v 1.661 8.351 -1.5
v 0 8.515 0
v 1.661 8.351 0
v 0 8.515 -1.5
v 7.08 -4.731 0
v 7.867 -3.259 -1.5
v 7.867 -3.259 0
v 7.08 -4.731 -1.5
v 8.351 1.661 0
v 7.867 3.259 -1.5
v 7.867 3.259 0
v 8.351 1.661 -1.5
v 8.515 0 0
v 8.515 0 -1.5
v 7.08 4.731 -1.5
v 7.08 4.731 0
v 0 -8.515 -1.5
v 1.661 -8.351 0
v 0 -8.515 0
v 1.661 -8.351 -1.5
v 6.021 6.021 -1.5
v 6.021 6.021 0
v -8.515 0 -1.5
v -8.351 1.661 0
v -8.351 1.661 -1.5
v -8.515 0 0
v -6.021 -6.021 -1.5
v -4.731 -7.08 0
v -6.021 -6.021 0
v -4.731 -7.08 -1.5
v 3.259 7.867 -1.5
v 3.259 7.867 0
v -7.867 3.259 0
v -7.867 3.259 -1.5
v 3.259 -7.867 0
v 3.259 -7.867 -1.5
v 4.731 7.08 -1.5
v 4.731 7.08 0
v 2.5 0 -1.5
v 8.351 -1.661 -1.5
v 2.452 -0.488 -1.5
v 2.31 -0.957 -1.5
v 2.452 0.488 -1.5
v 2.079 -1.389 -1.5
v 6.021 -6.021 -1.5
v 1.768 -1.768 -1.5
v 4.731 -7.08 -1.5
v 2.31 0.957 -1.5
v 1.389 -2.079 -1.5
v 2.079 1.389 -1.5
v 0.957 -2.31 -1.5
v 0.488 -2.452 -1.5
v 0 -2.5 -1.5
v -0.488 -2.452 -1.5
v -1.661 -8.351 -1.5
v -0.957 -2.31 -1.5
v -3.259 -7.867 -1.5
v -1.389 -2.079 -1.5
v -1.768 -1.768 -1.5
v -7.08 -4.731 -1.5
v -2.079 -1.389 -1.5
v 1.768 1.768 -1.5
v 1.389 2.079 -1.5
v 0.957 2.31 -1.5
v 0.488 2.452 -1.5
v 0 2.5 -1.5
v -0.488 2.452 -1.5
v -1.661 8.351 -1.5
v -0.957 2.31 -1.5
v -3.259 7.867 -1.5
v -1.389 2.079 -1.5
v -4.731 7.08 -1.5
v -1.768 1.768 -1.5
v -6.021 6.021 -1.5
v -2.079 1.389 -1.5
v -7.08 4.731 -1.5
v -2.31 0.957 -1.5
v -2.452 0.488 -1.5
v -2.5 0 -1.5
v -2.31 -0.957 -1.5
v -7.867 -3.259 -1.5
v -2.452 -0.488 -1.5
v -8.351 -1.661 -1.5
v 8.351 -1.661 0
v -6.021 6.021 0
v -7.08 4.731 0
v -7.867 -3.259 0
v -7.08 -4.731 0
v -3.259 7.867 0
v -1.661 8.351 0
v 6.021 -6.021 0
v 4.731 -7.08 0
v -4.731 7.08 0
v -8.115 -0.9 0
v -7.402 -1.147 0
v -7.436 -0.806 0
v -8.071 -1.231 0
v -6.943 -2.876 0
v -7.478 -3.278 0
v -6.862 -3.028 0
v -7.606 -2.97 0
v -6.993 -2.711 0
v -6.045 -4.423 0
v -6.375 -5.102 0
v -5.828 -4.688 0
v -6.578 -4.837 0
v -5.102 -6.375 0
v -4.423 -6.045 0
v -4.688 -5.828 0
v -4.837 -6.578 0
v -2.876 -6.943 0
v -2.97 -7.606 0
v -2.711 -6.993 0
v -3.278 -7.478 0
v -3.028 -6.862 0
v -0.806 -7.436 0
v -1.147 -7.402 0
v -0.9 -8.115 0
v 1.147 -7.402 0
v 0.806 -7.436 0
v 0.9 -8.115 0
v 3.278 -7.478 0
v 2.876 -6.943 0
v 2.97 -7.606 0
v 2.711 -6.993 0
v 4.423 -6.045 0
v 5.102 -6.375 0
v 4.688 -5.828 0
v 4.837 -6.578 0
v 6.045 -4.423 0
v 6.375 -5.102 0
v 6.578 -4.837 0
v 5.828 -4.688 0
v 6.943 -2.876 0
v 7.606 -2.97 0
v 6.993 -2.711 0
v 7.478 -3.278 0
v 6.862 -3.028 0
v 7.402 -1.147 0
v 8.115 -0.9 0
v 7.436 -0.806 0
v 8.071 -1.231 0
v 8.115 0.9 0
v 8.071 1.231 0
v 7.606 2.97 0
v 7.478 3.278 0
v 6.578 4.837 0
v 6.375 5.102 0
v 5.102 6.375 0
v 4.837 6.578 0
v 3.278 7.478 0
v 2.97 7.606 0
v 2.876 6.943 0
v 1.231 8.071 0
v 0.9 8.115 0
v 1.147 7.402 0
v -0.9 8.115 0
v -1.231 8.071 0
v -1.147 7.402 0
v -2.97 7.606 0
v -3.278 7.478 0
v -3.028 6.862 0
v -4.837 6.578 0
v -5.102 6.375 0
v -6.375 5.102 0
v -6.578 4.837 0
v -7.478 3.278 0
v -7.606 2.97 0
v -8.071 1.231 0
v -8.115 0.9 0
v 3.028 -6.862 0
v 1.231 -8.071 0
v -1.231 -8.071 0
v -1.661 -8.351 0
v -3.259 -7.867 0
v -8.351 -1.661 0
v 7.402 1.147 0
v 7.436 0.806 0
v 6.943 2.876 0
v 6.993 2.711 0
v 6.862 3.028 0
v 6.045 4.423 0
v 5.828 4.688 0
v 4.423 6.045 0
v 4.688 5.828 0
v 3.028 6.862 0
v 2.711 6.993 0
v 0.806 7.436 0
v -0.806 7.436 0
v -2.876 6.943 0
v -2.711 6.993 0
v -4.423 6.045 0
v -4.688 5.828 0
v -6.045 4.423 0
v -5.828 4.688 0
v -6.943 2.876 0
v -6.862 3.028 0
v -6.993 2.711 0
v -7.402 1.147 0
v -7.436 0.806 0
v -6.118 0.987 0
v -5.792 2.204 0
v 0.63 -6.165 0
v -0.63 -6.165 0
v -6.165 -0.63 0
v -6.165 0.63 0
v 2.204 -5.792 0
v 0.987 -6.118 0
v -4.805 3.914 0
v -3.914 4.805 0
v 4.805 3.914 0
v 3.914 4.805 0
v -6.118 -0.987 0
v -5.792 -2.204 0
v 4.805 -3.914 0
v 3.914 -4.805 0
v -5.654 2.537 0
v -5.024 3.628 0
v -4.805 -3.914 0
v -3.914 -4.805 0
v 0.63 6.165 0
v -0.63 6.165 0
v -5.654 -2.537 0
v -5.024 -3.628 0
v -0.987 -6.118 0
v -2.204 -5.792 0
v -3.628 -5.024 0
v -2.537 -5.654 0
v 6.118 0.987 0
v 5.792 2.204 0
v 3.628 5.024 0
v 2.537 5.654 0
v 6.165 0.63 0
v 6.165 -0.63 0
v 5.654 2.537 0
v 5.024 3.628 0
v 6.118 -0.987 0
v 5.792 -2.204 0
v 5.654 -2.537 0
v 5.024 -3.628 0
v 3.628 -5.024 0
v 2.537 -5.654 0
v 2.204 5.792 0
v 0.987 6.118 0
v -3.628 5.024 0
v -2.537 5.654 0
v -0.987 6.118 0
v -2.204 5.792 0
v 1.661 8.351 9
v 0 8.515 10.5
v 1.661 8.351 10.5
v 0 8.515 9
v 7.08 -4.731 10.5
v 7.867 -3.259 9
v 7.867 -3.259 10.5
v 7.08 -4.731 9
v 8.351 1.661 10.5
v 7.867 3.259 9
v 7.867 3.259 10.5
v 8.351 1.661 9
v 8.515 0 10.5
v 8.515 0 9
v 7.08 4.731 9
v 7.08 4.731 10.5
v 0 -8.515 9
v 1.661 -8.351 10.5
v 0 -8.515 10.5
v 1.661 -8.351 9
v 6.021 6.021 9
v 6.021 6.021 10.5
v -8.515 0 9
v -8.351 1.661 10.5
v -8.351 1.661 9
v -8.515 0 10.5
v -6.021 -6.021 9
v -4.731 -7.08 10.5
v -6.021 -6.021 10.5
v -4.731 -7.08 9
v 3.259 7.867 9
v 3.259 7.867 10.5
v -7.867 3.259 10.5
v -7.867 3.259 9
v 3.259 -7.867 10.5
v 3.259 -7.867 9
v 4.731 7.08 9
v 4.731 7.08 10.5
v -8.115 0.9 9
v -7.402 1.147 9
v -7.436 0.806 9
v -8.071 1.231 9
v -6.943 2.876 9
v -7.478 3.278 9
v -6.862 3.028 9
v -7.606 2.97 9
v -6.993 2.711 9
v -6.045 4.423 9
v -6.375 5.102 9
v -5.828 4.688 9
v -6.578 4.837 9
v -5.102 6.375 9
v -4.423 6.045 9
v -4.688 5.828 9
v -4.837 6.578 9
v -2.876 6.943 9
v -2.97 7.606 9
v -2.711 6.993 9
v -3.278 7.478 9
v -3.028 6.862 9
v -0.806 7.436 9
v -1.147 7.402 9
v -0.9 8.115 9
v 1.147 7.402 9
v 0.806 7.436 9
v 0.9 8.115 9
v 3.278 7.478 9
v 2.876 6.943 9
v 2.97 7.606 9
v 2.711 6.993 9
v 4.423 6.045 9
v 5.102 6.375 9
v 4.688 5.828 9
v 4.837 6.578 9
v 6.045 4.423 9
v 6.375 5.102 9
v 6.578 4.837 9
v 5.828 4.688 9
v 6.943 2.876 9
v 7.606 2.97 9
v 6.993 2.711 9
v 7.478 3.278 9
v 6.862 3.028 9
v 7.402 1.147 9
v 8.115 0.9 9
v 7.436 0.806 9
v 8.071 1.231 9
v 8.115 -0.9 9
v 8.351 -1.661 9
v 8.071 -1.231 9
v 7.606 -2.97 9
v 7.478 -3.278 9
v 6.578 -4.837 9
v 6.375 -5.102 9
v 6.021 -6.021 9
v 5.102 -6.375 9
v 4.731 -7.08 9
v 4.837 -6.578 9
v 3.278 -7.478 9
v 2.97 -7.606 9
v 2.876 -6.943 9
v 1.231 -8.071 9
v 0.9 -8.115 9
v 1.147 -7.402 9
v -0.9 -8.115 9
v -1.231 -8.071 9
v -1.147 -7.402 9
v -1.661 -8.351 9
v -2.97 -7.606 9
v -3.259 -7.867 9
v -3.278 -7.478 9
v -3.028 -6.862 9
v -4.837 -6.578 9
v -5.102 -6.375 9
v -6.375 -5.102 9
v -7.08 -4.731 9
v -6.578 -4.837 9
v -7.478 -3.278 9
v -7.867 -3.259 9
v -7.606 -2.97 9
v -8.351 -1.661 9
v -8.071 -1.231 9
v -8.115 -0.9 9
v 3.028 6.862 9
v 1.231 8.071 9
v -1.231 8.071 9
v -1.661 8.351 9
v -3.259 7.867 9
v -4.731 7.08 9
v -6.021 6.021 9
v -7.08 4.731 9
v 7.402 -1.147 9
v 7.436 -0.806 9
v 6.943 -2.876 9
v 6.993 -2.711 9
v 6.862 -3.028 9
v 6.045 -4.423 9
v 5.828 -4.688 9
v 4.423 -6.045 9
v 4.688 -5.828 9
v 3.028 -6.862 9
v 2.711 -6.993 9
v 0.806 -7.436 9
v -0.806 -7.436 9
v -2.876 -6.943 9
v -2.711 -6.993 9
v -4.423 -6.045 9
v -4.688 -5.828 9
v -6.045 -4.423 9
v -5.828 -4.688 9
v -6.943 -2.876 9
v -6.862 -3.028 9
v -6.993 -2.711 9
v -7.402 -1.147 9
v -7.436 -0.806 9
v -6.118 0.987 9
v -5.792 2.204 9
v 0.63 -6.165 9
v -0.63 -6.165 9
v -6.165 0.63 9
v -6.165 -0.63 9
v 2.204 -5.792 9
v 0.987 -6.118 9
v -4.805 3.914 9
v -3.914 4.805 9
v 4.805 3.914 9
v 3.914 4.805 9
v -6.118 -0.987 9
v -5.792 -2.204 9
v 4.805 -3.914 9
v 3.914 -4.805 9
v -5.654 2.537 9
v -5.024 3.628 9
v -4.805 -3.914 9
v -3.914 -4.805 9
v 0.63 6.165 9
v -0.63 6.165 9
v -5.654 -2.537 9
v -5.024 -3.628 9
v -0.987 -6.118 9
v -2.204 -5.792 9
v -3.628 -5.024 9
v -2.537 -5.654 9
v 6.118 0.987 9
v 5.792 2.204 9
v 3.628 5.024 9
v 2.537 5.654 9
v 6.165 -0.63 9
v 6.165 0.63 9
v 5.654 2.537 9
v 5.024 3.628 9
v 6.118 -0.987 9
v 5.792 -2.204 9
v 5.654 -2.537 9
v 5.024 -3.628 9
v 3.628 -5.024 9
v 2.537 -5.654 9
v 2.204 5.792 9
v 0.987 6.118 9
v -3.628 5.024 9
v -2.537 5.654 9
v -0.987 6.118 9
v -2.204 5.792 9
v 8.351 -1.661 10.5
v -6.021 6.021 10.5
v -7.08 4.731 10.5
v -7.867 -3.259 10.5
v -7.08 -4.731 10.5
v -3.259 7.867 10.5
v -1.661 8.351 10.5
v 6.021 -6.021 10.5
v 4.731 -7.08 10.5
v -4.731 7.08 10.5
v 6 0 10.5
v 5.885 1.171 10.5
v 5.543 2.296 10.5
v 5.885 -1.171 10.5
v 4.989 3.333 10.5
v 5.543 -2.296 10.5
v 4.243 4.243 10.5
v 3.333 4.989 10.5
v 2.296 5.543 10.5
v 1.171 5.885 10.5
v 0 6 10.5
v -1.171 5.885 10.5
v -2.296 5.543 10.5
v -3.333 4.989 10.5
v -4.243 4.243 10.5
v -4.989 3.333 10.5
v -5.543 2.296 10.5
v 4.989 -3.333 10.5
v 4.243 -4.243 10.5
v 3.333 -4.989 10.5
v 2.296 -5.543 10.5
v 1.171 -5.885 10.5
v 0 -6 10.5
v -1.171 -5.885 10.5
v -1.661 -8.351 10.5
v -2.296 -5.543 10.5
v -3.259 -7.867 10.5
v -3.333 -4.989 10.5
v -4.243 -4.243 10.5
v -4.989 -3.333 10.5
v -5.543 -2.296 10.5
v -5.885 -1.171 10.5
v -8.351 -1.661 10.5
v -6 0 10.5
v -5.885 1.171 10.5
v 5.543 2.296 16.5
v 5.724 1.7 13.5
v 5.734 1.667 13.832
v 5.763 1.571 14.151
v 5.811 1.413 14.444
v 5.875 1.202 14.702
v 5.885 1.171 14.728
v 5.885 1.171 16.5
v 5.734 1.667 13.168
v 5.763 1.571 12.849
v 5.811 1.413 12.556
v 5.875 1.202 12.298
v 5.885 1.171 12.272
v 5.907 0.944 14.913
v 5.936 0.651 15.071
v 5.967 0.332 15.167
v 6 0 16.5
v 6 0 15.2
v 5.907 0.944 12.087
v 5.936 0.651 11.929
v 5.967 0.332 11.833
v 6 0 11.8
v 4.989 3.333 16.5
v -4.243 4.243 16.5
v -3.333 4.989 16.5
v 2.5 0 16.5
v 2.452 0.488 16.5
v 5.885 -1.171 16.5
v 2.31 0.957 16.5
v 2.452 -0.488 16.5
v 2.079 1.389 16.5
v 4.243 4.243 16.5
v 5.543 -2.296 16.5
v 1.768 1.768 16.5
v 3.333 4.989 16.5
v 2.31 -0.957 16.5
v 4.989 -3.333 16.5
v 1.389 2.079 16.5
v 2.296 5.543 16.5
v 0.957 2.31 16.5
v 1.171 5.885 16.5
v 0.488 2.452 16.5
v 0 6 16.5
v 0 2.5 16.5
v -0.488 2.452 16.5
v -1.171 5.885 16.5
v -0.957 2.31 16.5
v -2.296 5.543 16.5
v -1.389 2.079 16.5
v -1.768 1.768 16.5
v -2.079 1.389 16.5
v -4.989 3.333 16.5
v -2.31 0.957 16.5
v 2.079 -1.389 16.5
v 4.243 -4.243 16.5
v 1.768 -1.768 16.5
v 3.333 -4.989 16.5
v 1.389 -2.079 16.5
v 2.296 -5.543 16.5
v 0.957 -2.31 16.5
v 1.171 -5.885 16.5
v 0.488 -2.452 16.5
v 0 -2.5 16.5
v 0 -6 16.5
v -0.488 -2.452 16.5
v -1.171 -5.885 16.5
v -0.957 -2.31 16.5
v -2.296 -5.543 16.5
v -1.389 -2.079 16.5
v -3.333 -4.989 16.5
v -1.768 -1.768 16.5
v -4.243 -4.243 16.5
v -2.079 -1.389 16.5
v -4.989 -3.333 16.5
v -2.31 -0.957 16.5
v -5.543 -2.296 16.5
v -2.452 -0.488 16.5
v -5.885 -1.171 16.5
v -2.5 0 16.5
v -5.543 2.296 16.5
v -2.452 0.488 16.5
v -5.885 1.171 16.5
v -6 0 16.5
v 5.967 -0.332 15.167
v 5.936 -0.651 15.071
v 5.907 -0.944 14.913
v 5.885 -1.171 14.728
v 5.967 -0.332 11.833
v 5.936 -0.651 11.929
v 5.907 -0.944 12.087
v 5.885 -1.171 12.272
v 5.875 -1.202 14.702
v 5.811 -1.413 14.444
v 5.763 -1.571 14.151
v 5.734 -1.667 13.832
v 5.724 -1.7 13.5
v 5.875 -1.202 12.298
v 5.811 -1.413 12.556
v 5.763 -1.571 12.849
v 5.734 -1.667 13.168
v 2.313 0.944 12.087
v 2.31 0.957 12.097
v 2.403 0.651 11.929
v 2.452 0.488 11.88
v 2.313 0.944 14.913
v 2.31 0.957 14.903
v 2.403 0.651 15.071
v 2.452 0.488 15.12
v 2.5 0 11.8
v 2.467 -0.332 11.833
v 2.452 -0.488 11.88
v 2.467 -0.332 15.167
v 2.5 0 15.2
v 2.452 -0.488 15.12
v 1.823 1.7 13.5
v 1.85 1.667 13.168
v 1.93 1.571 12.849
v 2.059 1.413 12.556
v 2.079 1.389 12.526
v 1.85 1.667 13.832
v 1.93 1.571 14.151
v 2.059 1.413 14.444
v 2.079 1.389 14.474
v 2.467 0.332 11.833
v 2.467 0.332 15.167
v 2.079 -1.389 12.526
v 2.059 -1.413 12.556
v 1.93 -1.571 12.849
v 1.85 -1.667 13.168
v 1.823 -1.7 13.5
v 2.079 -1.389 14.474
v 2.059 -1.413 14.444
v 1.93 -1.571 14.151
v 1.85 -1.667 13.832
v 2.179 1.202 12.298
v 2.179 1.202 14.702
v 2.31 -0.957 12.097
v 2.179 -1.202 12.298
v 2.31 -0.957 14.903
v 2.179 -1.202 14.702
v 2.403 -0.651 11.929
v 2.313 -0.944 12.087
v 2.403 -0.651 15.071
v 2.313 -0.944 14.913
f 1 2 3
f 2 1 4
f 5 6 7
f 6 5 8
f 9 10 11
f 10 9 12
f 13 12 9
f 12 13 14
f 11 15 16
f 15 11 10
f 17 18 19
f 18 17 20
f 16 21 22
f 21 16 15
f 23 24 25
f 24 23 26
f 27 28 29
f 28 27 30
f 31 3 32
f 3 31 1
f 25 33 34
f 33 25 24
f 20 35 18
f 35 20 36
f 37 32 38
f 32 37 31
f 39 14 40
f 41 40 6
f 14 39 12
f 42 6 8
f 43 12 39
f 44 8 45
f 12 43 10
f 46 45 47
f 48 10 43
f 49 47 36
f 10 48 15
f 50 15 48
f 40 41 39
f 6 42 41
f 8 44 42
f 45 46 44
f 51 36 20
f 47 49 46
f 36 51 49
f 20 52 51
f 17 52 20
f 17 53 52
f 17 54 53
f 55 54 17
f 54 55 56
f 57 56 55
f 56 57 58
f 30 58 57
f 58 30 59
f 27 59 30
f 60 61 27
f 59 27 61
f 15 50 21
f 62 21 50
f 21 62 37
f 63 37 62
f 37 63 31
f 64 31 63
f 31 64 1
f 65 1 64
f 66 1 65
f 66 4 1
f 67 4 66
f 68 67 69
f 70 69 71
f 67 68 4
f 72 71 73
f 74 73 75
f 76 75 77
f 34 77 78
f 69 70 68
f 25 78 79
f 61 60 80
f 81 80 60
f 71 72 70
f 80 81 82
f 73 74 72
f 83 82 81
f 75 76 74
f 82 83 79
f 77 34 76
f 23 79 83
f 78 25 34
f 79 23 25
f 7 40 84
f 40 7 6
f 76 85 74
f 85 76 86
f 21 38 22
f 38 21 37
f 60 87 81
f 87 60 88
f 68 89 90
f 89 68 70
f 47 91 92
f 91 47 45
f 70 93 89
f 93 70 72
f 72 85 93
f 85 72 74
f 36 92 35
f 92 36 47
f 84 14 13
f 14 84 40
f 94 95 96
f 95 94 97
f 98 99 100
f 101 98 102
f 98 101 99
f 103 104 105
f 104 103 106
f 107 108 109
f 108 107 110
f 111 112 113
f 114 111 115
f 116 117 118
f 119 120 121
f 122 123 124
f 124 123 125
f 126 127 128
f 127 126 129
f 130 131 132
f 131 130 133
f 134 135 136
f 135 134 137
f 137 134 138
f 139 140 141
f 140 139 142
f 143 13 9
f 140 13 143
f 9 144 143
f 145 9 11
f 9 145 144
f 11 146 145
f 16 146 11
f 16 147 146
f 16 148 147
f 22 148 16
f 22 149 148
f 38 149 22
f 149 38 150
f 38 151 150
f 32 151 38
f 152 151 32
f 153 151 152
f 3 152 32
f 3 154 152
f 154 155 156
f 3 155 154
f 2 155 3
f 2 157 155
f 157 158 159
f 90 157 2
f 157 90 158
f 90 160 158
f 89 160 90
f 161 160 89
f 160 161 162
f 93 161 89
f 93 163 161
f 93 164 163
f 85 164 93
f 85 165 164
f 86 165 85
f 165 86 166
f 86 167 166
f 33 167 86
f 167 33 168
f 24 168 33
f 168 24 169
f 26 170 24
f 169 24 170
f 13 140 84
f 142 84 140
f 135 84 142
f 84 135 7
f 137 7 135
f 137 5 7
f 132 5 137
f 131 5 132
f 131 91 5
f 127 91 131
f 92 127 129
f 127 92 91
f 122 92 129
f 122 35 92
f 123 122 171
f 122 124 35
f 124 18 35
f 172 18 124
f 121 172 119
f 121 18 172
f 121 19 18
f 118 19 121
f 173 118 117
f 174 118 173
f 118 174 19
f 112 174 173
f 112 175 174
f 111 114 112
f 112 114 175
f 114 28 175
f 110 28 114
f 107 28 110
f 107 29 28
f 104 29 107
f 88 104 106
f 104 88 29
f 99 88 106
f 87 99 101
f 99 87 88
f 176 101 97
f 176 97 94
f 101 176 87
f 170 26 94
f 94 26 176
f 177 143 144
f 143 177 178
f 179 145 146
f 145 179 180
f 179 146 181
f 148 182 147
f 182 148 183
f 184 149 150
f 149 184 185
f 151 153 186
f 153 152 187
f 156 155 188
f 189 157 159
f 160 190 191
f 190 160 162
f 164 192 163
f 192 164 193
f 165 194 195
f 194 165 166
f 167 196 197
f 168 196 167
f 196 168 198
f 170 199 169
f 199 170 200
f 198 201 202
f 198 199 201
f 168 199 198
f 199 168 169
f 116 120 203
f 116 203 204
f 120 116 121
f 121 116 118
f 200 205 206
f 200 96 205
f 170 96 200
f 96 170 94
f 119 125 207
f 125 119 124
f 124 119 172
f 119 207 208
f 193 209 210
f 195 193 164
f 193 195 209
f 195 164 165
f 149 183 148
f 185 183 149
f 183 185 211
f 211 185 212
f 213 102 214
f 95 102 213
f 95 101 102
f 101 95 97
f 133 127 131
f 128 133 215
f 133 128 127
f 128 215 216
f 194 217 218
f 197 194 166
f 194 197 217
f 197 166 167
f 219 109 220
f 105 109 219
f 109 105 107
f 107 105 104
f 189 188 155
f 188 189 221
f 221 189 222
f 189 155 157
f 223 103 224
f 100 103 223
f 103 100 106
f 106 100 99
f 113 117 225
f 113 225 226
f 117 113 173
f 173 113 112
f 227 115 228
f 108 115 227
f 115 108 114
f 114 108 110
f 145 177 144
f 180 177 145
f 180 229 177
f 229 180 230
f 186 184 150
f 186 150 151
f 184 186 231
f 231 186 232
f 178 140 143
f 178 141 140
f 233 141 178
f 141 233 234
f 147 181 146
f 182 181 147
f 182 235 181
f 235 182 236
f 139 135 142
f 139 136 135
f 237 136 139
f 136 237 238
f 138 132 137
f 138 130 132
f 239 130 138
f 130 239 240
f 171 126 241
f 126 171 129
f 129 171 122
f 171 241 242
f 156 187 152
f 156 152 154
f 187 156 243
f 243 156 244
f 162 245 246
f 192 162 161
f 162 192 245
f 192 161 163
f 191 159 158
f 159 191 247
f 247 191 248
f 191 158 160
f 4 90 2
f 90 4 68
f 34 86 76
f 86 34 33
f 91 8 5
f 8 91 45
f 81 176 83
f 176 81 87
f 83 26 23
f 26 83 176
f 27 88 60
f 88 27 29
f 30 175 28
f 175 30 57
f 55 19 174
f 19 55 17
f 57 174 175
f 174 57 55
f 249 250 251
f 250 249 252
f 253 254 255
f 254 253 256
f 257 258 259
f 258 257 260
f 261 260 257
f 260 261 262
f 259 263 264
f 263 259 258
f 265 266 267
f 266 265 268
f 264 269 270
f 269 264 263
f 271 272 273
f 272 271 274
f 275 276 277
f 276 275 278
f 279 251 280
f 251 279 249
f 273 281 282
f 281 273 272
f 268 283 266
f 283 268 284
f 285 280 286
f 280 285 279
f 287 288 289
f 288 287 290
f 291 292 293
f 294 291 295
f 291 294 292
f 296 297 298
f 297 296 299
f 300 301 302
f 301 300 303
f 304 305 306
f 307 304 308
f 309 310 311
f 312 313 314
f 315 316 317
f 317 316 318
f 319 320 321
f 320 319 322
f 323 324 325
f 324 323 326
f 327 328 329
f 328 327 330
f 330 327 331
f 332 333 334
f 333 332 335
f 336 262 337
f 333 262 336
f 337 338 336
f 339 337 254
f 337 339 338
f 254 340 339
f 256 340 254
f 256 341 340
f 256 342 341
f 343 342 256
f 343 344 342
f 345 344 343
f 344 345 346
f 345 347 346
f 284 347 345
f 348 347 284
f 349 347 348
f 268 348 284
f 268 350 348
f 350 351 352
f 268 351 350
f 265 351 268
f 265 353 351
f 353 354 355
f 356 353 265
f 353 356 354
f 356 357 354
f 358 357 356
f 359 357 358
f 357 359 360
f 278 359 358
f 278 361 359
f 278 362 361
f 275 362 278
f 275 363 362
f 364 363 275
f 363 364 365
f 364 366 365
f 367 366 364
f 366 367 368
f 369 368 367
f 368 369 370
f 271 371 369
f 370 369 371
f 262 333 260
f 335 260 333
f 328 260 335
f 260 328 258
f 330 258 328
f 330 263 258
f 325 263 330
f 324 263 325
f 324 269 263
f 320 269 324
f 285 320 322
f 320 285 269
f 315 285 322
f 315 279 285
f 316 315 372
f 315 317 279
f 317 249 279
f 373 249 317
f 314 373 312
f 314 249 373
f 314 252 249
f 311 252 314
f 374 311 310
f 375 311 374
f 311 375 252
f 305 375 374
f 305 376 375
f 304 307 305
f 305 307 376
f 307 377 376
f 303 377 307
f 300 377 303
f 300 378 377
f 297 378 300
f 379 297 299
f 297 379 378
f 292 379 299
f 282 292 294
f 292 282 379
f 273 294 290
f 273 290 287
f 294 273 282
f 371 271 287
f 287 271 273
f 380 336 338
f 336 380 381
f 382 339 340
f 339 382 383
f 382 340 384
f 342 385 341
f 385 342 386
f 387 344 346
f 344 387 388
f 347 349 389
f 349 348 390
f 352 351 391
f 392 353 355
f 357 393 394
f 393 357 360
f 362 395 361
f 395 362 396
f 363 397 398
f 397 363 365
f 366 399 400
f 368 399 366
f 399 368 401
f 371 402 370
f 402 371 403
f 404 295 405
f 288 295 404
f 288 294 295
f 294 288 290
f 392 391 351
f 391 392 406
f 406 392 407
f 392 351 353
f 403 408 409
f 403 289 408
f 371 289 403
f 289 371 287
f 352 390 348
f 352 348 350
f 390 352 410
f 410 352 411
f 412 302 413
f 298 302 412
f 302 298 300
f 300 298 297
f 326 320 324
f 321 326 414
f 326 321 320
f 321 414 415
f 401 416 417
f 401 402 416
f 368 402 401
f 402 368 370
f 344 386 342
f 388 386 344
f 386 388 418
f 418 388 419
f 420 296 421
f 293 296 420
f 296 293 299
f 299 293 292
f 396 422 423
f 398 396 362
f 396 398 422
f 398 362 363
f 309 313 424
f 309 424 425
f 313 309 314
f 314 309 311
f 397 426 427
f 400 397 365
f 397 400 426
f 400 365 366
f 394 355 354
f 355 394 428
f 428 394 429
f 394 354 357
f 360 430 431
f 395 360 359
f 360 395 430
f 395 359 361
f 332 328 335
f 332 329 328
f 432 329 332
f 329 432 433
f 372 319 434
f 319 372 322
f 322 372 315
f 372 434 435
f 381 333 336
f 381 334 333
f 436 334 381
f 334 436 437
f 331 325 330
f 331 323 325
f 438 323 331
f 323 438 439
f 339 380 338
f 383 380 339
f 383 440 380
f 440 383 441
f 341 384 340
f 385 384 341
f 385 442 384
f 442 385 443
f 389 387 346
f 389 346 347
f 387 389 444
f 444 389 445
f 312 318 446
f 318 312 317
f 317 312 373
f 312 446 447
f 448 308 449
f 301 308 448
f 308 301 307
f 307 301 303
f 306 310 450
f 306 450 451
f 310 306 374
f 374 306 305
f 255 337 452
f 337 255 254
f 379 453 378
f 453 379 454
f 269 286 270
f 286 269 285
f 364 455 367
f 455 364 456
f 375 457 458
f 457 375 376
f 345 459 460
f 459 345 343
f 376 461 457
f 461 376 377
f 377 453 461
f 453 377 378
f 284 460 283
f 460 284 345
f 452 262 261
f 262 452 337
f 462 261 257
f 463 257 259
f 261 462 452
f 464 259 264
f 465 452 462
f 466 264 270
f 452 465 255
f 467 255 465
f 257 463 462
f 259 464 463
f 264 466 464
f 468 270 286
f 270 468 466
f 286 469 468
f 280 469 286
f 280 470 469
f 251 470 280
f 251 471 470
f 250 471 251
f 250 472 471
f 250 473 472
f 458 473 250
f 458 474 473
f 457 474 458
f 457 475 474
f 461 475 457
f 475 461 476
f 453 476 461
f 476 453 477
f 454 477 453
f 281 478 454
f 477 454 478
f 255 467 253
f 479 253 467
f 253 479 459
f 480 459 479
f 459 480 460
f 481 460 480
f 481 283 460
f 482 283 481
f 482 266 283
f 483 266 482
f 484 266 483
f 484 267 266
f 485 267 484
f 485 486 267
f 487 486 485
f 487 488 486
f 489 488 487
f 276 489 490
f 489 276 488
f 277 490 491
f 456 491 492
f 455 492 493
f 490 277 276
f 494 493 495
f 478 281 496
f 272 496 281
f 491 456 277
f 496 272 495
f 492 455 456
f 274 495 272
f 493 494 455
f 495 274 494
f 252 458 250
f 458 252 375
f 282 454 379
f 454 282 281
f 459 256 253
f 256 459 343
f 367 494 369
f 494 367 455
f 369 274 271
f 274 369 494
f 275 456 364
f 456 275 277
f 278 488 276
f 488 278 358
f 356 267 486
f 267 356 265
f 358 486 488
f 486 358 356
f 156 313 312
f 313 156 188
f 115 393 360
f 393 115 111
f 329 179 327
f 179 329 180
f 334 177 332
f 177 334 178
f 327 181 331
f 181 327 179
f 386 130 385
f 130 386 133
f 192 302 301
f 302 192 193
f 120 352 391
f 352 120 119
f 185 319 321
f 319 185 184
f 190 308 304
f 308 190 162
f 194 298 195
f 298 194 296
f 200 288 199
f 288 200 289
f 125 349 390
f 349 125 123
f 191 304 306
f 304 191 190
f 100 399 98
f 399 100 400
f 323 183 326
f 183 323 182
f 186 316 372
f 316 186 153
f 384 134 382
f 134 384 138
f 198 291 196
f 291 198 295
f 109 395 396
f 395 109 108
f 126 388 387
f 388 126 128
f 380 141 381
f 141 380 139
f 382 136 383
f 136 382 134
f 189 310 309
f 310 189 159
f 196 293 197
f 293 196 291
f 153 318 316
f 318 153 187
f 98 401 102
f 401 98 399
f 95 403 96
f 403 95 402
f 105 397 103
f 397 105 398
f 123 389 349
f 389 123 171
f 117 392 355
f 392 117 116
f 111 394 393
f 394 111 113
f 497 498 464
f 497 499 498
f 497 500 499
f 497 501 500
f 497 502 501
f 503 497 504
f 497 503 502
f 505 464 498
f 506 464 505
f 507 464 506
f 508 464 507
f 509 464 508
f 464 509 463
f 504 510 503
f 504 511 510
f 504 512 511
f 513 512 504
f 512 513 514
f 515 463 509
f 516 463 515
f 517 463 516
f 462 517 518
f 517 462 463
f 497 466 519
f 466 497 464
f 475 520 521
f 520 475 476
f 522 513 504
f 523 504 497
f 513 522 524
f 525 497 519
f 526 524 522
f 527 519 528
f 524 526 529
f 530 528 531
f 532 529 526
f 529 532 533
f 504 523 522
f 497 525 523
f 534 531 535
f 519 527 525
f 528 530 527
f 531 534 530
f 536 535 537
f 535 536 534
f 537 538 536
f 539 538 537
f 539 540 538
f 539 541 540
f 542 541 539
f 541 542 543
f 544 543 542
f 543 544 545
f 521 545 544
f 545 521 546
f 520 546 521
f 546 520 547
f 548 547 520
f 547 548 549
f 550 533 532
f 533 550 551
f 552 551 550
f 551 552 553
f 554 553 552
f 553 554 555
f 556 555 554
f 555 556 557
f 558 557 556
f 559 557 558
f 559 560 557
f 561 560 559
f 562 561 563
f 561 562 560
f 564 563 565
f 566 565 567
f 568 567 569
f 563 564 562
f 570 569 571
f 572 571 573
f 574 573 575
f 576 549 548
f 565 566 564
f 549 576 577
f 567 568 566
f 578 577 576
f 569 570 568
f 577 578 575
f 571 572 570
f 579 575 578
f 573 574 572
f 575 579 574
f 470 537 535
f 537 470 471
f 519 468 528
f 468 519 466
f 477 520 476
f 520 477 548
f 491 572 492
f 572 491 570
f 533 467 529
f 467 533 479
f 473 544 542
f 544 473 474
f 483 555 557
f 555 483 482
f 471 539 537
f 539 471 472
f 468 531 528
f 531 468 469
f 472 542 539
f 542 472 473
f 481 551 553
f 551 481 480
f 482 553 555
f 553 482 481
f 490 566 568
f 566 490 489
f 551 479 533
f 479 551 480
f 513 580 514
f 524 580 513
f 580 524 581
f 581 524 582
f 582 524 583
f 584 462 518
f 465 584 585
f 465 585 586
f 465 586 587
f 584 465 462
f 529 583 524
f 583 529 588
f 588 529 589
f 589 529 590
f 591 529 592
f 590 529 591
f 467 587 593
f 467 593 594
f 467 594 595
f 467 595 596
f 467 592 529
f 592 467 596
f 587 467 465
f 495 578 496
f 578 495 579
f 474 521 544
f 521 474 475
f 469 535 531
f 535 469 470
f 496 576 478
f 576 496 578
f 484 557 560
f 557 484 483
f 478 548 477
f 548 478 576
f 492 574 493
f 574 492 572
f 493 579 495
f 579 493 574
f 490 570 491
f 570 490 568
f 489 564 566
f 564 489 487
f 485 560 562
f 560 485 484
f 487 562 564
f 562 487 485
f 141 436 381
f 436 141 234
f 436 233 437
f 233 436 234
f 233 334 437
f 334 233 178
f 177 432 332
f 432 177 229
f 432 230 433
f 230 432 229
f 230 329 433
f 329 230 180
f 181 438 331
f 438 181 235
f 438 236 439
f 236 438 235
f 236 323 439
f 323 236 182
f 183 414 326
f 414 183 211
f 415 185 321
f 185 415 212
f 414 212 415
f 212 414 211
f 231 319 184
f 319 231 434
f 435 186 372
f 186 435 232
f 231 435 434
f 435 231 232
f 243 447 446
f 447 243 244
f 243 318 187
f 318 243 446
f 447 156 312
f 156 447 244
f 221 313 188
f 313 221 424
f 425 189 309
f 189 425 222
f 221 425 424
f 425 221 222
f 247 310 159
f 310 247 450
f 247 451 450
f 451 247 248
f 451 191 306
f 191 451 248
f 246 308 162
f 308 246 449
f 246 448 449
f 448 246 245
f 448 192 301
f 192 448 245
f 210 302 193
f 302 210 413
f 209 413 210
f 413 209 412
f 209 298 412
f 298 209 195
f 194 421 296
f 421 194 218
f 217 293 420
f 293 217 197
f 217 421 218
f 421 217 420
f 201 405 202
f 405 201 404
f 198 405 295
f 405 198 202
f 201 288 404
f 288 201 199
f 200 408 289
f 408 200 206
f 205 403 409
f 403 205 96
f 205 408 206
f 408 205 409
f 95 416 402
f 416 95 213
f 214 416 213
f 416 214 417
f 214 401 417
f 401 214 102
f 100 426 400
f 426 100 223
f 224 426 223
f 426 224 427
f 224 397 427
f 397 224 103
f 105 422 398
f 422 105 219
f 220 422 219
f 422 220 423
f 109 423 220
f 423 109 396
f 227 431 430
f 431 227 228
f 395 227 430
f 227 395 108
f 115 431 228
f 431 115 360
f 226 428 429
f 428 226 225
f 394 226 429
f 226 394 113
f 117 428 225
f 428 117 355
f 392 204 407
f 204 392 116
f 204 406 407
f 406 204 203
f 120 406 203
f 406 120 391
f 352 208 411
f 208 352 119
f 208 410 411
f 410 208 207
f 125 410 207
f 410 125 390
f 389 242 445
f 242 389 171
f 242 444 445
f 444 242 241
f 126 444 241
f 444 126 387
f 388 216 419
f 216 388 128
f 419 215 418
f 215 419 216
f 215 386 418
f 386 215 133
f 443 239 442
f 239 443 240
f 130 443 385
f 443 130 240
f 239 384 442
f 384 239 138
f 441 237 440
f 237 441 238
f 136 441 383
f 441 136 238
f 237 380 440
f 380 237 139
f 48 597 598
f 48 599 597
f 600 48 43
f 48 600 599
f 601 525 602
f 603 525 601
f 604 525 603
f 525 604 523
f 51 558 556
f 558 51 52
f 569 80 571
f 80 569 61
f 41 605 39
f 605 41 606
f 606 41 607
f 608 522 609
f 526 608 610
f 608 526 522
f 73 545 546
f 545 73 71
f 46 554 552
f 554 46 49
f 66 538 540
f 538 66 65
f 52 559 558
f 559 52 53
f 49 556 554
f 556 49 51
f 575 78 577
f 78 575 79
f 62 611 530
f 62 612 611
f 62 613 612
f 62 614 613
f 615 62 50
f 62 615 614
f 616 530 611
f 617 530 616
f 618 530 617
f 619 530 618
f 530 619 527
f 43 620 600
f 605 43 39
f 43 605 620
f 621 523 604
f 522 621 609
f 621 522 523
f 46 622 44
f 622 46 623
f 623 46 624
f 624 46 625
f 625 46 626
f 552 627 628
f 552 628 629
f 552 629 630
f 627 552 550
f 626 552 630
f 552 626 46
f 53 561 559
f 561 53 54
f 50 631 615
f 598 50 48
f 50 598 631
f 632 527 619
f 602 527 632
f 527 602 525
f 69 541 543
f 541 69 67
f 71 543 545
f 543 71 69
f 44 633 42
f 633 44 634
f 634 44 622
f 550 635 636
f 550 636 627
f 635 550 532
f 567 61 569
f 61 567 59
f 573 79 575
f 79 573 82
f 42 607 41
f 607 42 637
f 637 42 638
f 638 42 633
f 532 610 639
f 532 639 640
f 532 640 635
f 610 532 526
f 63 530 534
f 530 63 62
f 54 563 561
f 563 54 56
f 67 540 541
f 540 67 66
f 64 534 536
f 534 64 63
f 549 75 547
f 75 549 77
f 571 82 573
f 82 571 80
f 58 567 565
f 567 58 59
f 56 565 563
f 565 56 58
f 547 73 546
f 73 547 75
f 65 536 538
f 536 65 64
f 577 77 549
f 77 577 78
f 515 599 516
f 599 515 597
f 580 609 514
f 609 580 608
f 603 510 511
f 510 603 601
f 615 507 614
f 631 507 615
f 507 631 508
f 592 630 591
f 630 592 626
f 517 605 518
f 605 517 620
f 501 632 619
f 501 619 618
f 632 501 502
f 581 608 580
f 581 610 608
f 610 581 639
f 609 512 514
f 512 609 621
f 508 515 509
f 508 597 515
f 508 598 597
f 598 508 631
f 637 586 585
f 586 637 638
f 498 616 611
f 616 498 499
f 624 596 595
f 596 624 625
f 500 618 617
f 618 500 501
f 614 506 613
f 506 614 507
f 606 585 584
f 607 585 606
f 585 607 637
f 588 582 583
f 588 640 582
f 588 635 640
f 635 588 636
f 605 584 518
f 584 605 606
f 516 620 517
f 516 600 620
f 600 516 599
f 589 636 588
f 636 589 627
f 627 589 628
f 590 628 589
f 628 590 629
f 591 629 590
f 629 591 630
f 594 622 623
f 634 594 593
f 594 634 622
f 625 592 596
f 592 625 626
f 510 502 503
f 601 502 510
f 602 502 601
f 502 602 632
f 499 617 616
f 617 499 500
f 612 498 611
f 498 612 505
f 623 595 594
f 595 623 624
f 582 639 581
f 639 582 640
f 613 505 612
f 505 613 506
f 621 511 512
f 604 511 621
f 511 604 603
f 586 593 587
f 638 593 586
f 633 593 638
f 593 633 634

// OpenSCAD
$fn = 32;

// ----------------------------------------------------------------------
// Timing pulley: GT2 24T, pitch 2 mm, 17.03 mm x 18 mm
// ----------------------------------------------------------------------

// --- parameters (mm) ---
pitch = 2;                // belt pitch
teeth = 24;               // number of grooves
belt_w = 9;               // belt width between the flanges
tip_d = 15.03;            // tip circle diameter
root_d = 13.53;           // groove bottom diameter
groove_h = 0.75;          // groove depth
tooth_w = 1.5;            // groove width at the tip circle
flange_d = 17.03;         // flange diameter
flange_t = 1.5;           // flange thickness
spigot_d = 11.93;         // flange spigot, sunk into the rim
spigot_h = 1.2;           // spigot depth into the rim
bore_d = 5;               // shaft bore
hub_d = 12;               // hub diameter
hub_h = 6;                // hub above the flange
bottom_z = -1.5;          // lowest point of the pulley
top_z = 16.5;             // highest point of the pulley
set_d = 3.4;              // set screw tap hole

module rim() {
  cylinder(h = belt_w, d = tip_d);
}

module groove_cutter() {
  /* belt tooth groove: deeper than wide, cut through the belt width */
  translate([root_d / 2, 0, 0])
    linear_extrude(height = belt_w)
      polygon(points = [[-0.6, -tooth_w * 0.42], [groove_h + 0.6, -tooth_w * 0.6],
                        [groove_h + 0.6, tooth_w * 0.6], [-0.6, tooth_w * 0.42]]);
}

module flanges() {
  translate([0, 0, -flange_t]) cylinder(h = flange_t, d = flange_d);
  translate([0, 0, belt_w]) cylinder(h = flange_t, d = flange_d);
  translate([0, 0, -spigot_h]) cylinder(h = spigot_h + 0.6, d = spigot_d);
  translate([0, 0, belt_w - 0.6]) cylinder(h = spigot_h + 0.6, d = spigot_d);
}

module hub() {
  translate([0, 0, bottom_z]) cylinder(h = top_z - bottom_z, d = hub_d);
}

difference() {
  union() {
    rim();
    hub();
    flanges();
  }
  for (i = [0 : teeth - 1]) rotate([0, 0, i * 360 / teeth]) groove_cutter();
  translate([0, 0, bottom_z - 1]) cylinder(h = top_z - bottom_z + 2, d = bore_d);
  translate([-1, 0, top_z - hub_h * 0.5]) rotate([0, 90, 0]) cylinder(h = hub_d / 2 + 3, d = set_d);
}
